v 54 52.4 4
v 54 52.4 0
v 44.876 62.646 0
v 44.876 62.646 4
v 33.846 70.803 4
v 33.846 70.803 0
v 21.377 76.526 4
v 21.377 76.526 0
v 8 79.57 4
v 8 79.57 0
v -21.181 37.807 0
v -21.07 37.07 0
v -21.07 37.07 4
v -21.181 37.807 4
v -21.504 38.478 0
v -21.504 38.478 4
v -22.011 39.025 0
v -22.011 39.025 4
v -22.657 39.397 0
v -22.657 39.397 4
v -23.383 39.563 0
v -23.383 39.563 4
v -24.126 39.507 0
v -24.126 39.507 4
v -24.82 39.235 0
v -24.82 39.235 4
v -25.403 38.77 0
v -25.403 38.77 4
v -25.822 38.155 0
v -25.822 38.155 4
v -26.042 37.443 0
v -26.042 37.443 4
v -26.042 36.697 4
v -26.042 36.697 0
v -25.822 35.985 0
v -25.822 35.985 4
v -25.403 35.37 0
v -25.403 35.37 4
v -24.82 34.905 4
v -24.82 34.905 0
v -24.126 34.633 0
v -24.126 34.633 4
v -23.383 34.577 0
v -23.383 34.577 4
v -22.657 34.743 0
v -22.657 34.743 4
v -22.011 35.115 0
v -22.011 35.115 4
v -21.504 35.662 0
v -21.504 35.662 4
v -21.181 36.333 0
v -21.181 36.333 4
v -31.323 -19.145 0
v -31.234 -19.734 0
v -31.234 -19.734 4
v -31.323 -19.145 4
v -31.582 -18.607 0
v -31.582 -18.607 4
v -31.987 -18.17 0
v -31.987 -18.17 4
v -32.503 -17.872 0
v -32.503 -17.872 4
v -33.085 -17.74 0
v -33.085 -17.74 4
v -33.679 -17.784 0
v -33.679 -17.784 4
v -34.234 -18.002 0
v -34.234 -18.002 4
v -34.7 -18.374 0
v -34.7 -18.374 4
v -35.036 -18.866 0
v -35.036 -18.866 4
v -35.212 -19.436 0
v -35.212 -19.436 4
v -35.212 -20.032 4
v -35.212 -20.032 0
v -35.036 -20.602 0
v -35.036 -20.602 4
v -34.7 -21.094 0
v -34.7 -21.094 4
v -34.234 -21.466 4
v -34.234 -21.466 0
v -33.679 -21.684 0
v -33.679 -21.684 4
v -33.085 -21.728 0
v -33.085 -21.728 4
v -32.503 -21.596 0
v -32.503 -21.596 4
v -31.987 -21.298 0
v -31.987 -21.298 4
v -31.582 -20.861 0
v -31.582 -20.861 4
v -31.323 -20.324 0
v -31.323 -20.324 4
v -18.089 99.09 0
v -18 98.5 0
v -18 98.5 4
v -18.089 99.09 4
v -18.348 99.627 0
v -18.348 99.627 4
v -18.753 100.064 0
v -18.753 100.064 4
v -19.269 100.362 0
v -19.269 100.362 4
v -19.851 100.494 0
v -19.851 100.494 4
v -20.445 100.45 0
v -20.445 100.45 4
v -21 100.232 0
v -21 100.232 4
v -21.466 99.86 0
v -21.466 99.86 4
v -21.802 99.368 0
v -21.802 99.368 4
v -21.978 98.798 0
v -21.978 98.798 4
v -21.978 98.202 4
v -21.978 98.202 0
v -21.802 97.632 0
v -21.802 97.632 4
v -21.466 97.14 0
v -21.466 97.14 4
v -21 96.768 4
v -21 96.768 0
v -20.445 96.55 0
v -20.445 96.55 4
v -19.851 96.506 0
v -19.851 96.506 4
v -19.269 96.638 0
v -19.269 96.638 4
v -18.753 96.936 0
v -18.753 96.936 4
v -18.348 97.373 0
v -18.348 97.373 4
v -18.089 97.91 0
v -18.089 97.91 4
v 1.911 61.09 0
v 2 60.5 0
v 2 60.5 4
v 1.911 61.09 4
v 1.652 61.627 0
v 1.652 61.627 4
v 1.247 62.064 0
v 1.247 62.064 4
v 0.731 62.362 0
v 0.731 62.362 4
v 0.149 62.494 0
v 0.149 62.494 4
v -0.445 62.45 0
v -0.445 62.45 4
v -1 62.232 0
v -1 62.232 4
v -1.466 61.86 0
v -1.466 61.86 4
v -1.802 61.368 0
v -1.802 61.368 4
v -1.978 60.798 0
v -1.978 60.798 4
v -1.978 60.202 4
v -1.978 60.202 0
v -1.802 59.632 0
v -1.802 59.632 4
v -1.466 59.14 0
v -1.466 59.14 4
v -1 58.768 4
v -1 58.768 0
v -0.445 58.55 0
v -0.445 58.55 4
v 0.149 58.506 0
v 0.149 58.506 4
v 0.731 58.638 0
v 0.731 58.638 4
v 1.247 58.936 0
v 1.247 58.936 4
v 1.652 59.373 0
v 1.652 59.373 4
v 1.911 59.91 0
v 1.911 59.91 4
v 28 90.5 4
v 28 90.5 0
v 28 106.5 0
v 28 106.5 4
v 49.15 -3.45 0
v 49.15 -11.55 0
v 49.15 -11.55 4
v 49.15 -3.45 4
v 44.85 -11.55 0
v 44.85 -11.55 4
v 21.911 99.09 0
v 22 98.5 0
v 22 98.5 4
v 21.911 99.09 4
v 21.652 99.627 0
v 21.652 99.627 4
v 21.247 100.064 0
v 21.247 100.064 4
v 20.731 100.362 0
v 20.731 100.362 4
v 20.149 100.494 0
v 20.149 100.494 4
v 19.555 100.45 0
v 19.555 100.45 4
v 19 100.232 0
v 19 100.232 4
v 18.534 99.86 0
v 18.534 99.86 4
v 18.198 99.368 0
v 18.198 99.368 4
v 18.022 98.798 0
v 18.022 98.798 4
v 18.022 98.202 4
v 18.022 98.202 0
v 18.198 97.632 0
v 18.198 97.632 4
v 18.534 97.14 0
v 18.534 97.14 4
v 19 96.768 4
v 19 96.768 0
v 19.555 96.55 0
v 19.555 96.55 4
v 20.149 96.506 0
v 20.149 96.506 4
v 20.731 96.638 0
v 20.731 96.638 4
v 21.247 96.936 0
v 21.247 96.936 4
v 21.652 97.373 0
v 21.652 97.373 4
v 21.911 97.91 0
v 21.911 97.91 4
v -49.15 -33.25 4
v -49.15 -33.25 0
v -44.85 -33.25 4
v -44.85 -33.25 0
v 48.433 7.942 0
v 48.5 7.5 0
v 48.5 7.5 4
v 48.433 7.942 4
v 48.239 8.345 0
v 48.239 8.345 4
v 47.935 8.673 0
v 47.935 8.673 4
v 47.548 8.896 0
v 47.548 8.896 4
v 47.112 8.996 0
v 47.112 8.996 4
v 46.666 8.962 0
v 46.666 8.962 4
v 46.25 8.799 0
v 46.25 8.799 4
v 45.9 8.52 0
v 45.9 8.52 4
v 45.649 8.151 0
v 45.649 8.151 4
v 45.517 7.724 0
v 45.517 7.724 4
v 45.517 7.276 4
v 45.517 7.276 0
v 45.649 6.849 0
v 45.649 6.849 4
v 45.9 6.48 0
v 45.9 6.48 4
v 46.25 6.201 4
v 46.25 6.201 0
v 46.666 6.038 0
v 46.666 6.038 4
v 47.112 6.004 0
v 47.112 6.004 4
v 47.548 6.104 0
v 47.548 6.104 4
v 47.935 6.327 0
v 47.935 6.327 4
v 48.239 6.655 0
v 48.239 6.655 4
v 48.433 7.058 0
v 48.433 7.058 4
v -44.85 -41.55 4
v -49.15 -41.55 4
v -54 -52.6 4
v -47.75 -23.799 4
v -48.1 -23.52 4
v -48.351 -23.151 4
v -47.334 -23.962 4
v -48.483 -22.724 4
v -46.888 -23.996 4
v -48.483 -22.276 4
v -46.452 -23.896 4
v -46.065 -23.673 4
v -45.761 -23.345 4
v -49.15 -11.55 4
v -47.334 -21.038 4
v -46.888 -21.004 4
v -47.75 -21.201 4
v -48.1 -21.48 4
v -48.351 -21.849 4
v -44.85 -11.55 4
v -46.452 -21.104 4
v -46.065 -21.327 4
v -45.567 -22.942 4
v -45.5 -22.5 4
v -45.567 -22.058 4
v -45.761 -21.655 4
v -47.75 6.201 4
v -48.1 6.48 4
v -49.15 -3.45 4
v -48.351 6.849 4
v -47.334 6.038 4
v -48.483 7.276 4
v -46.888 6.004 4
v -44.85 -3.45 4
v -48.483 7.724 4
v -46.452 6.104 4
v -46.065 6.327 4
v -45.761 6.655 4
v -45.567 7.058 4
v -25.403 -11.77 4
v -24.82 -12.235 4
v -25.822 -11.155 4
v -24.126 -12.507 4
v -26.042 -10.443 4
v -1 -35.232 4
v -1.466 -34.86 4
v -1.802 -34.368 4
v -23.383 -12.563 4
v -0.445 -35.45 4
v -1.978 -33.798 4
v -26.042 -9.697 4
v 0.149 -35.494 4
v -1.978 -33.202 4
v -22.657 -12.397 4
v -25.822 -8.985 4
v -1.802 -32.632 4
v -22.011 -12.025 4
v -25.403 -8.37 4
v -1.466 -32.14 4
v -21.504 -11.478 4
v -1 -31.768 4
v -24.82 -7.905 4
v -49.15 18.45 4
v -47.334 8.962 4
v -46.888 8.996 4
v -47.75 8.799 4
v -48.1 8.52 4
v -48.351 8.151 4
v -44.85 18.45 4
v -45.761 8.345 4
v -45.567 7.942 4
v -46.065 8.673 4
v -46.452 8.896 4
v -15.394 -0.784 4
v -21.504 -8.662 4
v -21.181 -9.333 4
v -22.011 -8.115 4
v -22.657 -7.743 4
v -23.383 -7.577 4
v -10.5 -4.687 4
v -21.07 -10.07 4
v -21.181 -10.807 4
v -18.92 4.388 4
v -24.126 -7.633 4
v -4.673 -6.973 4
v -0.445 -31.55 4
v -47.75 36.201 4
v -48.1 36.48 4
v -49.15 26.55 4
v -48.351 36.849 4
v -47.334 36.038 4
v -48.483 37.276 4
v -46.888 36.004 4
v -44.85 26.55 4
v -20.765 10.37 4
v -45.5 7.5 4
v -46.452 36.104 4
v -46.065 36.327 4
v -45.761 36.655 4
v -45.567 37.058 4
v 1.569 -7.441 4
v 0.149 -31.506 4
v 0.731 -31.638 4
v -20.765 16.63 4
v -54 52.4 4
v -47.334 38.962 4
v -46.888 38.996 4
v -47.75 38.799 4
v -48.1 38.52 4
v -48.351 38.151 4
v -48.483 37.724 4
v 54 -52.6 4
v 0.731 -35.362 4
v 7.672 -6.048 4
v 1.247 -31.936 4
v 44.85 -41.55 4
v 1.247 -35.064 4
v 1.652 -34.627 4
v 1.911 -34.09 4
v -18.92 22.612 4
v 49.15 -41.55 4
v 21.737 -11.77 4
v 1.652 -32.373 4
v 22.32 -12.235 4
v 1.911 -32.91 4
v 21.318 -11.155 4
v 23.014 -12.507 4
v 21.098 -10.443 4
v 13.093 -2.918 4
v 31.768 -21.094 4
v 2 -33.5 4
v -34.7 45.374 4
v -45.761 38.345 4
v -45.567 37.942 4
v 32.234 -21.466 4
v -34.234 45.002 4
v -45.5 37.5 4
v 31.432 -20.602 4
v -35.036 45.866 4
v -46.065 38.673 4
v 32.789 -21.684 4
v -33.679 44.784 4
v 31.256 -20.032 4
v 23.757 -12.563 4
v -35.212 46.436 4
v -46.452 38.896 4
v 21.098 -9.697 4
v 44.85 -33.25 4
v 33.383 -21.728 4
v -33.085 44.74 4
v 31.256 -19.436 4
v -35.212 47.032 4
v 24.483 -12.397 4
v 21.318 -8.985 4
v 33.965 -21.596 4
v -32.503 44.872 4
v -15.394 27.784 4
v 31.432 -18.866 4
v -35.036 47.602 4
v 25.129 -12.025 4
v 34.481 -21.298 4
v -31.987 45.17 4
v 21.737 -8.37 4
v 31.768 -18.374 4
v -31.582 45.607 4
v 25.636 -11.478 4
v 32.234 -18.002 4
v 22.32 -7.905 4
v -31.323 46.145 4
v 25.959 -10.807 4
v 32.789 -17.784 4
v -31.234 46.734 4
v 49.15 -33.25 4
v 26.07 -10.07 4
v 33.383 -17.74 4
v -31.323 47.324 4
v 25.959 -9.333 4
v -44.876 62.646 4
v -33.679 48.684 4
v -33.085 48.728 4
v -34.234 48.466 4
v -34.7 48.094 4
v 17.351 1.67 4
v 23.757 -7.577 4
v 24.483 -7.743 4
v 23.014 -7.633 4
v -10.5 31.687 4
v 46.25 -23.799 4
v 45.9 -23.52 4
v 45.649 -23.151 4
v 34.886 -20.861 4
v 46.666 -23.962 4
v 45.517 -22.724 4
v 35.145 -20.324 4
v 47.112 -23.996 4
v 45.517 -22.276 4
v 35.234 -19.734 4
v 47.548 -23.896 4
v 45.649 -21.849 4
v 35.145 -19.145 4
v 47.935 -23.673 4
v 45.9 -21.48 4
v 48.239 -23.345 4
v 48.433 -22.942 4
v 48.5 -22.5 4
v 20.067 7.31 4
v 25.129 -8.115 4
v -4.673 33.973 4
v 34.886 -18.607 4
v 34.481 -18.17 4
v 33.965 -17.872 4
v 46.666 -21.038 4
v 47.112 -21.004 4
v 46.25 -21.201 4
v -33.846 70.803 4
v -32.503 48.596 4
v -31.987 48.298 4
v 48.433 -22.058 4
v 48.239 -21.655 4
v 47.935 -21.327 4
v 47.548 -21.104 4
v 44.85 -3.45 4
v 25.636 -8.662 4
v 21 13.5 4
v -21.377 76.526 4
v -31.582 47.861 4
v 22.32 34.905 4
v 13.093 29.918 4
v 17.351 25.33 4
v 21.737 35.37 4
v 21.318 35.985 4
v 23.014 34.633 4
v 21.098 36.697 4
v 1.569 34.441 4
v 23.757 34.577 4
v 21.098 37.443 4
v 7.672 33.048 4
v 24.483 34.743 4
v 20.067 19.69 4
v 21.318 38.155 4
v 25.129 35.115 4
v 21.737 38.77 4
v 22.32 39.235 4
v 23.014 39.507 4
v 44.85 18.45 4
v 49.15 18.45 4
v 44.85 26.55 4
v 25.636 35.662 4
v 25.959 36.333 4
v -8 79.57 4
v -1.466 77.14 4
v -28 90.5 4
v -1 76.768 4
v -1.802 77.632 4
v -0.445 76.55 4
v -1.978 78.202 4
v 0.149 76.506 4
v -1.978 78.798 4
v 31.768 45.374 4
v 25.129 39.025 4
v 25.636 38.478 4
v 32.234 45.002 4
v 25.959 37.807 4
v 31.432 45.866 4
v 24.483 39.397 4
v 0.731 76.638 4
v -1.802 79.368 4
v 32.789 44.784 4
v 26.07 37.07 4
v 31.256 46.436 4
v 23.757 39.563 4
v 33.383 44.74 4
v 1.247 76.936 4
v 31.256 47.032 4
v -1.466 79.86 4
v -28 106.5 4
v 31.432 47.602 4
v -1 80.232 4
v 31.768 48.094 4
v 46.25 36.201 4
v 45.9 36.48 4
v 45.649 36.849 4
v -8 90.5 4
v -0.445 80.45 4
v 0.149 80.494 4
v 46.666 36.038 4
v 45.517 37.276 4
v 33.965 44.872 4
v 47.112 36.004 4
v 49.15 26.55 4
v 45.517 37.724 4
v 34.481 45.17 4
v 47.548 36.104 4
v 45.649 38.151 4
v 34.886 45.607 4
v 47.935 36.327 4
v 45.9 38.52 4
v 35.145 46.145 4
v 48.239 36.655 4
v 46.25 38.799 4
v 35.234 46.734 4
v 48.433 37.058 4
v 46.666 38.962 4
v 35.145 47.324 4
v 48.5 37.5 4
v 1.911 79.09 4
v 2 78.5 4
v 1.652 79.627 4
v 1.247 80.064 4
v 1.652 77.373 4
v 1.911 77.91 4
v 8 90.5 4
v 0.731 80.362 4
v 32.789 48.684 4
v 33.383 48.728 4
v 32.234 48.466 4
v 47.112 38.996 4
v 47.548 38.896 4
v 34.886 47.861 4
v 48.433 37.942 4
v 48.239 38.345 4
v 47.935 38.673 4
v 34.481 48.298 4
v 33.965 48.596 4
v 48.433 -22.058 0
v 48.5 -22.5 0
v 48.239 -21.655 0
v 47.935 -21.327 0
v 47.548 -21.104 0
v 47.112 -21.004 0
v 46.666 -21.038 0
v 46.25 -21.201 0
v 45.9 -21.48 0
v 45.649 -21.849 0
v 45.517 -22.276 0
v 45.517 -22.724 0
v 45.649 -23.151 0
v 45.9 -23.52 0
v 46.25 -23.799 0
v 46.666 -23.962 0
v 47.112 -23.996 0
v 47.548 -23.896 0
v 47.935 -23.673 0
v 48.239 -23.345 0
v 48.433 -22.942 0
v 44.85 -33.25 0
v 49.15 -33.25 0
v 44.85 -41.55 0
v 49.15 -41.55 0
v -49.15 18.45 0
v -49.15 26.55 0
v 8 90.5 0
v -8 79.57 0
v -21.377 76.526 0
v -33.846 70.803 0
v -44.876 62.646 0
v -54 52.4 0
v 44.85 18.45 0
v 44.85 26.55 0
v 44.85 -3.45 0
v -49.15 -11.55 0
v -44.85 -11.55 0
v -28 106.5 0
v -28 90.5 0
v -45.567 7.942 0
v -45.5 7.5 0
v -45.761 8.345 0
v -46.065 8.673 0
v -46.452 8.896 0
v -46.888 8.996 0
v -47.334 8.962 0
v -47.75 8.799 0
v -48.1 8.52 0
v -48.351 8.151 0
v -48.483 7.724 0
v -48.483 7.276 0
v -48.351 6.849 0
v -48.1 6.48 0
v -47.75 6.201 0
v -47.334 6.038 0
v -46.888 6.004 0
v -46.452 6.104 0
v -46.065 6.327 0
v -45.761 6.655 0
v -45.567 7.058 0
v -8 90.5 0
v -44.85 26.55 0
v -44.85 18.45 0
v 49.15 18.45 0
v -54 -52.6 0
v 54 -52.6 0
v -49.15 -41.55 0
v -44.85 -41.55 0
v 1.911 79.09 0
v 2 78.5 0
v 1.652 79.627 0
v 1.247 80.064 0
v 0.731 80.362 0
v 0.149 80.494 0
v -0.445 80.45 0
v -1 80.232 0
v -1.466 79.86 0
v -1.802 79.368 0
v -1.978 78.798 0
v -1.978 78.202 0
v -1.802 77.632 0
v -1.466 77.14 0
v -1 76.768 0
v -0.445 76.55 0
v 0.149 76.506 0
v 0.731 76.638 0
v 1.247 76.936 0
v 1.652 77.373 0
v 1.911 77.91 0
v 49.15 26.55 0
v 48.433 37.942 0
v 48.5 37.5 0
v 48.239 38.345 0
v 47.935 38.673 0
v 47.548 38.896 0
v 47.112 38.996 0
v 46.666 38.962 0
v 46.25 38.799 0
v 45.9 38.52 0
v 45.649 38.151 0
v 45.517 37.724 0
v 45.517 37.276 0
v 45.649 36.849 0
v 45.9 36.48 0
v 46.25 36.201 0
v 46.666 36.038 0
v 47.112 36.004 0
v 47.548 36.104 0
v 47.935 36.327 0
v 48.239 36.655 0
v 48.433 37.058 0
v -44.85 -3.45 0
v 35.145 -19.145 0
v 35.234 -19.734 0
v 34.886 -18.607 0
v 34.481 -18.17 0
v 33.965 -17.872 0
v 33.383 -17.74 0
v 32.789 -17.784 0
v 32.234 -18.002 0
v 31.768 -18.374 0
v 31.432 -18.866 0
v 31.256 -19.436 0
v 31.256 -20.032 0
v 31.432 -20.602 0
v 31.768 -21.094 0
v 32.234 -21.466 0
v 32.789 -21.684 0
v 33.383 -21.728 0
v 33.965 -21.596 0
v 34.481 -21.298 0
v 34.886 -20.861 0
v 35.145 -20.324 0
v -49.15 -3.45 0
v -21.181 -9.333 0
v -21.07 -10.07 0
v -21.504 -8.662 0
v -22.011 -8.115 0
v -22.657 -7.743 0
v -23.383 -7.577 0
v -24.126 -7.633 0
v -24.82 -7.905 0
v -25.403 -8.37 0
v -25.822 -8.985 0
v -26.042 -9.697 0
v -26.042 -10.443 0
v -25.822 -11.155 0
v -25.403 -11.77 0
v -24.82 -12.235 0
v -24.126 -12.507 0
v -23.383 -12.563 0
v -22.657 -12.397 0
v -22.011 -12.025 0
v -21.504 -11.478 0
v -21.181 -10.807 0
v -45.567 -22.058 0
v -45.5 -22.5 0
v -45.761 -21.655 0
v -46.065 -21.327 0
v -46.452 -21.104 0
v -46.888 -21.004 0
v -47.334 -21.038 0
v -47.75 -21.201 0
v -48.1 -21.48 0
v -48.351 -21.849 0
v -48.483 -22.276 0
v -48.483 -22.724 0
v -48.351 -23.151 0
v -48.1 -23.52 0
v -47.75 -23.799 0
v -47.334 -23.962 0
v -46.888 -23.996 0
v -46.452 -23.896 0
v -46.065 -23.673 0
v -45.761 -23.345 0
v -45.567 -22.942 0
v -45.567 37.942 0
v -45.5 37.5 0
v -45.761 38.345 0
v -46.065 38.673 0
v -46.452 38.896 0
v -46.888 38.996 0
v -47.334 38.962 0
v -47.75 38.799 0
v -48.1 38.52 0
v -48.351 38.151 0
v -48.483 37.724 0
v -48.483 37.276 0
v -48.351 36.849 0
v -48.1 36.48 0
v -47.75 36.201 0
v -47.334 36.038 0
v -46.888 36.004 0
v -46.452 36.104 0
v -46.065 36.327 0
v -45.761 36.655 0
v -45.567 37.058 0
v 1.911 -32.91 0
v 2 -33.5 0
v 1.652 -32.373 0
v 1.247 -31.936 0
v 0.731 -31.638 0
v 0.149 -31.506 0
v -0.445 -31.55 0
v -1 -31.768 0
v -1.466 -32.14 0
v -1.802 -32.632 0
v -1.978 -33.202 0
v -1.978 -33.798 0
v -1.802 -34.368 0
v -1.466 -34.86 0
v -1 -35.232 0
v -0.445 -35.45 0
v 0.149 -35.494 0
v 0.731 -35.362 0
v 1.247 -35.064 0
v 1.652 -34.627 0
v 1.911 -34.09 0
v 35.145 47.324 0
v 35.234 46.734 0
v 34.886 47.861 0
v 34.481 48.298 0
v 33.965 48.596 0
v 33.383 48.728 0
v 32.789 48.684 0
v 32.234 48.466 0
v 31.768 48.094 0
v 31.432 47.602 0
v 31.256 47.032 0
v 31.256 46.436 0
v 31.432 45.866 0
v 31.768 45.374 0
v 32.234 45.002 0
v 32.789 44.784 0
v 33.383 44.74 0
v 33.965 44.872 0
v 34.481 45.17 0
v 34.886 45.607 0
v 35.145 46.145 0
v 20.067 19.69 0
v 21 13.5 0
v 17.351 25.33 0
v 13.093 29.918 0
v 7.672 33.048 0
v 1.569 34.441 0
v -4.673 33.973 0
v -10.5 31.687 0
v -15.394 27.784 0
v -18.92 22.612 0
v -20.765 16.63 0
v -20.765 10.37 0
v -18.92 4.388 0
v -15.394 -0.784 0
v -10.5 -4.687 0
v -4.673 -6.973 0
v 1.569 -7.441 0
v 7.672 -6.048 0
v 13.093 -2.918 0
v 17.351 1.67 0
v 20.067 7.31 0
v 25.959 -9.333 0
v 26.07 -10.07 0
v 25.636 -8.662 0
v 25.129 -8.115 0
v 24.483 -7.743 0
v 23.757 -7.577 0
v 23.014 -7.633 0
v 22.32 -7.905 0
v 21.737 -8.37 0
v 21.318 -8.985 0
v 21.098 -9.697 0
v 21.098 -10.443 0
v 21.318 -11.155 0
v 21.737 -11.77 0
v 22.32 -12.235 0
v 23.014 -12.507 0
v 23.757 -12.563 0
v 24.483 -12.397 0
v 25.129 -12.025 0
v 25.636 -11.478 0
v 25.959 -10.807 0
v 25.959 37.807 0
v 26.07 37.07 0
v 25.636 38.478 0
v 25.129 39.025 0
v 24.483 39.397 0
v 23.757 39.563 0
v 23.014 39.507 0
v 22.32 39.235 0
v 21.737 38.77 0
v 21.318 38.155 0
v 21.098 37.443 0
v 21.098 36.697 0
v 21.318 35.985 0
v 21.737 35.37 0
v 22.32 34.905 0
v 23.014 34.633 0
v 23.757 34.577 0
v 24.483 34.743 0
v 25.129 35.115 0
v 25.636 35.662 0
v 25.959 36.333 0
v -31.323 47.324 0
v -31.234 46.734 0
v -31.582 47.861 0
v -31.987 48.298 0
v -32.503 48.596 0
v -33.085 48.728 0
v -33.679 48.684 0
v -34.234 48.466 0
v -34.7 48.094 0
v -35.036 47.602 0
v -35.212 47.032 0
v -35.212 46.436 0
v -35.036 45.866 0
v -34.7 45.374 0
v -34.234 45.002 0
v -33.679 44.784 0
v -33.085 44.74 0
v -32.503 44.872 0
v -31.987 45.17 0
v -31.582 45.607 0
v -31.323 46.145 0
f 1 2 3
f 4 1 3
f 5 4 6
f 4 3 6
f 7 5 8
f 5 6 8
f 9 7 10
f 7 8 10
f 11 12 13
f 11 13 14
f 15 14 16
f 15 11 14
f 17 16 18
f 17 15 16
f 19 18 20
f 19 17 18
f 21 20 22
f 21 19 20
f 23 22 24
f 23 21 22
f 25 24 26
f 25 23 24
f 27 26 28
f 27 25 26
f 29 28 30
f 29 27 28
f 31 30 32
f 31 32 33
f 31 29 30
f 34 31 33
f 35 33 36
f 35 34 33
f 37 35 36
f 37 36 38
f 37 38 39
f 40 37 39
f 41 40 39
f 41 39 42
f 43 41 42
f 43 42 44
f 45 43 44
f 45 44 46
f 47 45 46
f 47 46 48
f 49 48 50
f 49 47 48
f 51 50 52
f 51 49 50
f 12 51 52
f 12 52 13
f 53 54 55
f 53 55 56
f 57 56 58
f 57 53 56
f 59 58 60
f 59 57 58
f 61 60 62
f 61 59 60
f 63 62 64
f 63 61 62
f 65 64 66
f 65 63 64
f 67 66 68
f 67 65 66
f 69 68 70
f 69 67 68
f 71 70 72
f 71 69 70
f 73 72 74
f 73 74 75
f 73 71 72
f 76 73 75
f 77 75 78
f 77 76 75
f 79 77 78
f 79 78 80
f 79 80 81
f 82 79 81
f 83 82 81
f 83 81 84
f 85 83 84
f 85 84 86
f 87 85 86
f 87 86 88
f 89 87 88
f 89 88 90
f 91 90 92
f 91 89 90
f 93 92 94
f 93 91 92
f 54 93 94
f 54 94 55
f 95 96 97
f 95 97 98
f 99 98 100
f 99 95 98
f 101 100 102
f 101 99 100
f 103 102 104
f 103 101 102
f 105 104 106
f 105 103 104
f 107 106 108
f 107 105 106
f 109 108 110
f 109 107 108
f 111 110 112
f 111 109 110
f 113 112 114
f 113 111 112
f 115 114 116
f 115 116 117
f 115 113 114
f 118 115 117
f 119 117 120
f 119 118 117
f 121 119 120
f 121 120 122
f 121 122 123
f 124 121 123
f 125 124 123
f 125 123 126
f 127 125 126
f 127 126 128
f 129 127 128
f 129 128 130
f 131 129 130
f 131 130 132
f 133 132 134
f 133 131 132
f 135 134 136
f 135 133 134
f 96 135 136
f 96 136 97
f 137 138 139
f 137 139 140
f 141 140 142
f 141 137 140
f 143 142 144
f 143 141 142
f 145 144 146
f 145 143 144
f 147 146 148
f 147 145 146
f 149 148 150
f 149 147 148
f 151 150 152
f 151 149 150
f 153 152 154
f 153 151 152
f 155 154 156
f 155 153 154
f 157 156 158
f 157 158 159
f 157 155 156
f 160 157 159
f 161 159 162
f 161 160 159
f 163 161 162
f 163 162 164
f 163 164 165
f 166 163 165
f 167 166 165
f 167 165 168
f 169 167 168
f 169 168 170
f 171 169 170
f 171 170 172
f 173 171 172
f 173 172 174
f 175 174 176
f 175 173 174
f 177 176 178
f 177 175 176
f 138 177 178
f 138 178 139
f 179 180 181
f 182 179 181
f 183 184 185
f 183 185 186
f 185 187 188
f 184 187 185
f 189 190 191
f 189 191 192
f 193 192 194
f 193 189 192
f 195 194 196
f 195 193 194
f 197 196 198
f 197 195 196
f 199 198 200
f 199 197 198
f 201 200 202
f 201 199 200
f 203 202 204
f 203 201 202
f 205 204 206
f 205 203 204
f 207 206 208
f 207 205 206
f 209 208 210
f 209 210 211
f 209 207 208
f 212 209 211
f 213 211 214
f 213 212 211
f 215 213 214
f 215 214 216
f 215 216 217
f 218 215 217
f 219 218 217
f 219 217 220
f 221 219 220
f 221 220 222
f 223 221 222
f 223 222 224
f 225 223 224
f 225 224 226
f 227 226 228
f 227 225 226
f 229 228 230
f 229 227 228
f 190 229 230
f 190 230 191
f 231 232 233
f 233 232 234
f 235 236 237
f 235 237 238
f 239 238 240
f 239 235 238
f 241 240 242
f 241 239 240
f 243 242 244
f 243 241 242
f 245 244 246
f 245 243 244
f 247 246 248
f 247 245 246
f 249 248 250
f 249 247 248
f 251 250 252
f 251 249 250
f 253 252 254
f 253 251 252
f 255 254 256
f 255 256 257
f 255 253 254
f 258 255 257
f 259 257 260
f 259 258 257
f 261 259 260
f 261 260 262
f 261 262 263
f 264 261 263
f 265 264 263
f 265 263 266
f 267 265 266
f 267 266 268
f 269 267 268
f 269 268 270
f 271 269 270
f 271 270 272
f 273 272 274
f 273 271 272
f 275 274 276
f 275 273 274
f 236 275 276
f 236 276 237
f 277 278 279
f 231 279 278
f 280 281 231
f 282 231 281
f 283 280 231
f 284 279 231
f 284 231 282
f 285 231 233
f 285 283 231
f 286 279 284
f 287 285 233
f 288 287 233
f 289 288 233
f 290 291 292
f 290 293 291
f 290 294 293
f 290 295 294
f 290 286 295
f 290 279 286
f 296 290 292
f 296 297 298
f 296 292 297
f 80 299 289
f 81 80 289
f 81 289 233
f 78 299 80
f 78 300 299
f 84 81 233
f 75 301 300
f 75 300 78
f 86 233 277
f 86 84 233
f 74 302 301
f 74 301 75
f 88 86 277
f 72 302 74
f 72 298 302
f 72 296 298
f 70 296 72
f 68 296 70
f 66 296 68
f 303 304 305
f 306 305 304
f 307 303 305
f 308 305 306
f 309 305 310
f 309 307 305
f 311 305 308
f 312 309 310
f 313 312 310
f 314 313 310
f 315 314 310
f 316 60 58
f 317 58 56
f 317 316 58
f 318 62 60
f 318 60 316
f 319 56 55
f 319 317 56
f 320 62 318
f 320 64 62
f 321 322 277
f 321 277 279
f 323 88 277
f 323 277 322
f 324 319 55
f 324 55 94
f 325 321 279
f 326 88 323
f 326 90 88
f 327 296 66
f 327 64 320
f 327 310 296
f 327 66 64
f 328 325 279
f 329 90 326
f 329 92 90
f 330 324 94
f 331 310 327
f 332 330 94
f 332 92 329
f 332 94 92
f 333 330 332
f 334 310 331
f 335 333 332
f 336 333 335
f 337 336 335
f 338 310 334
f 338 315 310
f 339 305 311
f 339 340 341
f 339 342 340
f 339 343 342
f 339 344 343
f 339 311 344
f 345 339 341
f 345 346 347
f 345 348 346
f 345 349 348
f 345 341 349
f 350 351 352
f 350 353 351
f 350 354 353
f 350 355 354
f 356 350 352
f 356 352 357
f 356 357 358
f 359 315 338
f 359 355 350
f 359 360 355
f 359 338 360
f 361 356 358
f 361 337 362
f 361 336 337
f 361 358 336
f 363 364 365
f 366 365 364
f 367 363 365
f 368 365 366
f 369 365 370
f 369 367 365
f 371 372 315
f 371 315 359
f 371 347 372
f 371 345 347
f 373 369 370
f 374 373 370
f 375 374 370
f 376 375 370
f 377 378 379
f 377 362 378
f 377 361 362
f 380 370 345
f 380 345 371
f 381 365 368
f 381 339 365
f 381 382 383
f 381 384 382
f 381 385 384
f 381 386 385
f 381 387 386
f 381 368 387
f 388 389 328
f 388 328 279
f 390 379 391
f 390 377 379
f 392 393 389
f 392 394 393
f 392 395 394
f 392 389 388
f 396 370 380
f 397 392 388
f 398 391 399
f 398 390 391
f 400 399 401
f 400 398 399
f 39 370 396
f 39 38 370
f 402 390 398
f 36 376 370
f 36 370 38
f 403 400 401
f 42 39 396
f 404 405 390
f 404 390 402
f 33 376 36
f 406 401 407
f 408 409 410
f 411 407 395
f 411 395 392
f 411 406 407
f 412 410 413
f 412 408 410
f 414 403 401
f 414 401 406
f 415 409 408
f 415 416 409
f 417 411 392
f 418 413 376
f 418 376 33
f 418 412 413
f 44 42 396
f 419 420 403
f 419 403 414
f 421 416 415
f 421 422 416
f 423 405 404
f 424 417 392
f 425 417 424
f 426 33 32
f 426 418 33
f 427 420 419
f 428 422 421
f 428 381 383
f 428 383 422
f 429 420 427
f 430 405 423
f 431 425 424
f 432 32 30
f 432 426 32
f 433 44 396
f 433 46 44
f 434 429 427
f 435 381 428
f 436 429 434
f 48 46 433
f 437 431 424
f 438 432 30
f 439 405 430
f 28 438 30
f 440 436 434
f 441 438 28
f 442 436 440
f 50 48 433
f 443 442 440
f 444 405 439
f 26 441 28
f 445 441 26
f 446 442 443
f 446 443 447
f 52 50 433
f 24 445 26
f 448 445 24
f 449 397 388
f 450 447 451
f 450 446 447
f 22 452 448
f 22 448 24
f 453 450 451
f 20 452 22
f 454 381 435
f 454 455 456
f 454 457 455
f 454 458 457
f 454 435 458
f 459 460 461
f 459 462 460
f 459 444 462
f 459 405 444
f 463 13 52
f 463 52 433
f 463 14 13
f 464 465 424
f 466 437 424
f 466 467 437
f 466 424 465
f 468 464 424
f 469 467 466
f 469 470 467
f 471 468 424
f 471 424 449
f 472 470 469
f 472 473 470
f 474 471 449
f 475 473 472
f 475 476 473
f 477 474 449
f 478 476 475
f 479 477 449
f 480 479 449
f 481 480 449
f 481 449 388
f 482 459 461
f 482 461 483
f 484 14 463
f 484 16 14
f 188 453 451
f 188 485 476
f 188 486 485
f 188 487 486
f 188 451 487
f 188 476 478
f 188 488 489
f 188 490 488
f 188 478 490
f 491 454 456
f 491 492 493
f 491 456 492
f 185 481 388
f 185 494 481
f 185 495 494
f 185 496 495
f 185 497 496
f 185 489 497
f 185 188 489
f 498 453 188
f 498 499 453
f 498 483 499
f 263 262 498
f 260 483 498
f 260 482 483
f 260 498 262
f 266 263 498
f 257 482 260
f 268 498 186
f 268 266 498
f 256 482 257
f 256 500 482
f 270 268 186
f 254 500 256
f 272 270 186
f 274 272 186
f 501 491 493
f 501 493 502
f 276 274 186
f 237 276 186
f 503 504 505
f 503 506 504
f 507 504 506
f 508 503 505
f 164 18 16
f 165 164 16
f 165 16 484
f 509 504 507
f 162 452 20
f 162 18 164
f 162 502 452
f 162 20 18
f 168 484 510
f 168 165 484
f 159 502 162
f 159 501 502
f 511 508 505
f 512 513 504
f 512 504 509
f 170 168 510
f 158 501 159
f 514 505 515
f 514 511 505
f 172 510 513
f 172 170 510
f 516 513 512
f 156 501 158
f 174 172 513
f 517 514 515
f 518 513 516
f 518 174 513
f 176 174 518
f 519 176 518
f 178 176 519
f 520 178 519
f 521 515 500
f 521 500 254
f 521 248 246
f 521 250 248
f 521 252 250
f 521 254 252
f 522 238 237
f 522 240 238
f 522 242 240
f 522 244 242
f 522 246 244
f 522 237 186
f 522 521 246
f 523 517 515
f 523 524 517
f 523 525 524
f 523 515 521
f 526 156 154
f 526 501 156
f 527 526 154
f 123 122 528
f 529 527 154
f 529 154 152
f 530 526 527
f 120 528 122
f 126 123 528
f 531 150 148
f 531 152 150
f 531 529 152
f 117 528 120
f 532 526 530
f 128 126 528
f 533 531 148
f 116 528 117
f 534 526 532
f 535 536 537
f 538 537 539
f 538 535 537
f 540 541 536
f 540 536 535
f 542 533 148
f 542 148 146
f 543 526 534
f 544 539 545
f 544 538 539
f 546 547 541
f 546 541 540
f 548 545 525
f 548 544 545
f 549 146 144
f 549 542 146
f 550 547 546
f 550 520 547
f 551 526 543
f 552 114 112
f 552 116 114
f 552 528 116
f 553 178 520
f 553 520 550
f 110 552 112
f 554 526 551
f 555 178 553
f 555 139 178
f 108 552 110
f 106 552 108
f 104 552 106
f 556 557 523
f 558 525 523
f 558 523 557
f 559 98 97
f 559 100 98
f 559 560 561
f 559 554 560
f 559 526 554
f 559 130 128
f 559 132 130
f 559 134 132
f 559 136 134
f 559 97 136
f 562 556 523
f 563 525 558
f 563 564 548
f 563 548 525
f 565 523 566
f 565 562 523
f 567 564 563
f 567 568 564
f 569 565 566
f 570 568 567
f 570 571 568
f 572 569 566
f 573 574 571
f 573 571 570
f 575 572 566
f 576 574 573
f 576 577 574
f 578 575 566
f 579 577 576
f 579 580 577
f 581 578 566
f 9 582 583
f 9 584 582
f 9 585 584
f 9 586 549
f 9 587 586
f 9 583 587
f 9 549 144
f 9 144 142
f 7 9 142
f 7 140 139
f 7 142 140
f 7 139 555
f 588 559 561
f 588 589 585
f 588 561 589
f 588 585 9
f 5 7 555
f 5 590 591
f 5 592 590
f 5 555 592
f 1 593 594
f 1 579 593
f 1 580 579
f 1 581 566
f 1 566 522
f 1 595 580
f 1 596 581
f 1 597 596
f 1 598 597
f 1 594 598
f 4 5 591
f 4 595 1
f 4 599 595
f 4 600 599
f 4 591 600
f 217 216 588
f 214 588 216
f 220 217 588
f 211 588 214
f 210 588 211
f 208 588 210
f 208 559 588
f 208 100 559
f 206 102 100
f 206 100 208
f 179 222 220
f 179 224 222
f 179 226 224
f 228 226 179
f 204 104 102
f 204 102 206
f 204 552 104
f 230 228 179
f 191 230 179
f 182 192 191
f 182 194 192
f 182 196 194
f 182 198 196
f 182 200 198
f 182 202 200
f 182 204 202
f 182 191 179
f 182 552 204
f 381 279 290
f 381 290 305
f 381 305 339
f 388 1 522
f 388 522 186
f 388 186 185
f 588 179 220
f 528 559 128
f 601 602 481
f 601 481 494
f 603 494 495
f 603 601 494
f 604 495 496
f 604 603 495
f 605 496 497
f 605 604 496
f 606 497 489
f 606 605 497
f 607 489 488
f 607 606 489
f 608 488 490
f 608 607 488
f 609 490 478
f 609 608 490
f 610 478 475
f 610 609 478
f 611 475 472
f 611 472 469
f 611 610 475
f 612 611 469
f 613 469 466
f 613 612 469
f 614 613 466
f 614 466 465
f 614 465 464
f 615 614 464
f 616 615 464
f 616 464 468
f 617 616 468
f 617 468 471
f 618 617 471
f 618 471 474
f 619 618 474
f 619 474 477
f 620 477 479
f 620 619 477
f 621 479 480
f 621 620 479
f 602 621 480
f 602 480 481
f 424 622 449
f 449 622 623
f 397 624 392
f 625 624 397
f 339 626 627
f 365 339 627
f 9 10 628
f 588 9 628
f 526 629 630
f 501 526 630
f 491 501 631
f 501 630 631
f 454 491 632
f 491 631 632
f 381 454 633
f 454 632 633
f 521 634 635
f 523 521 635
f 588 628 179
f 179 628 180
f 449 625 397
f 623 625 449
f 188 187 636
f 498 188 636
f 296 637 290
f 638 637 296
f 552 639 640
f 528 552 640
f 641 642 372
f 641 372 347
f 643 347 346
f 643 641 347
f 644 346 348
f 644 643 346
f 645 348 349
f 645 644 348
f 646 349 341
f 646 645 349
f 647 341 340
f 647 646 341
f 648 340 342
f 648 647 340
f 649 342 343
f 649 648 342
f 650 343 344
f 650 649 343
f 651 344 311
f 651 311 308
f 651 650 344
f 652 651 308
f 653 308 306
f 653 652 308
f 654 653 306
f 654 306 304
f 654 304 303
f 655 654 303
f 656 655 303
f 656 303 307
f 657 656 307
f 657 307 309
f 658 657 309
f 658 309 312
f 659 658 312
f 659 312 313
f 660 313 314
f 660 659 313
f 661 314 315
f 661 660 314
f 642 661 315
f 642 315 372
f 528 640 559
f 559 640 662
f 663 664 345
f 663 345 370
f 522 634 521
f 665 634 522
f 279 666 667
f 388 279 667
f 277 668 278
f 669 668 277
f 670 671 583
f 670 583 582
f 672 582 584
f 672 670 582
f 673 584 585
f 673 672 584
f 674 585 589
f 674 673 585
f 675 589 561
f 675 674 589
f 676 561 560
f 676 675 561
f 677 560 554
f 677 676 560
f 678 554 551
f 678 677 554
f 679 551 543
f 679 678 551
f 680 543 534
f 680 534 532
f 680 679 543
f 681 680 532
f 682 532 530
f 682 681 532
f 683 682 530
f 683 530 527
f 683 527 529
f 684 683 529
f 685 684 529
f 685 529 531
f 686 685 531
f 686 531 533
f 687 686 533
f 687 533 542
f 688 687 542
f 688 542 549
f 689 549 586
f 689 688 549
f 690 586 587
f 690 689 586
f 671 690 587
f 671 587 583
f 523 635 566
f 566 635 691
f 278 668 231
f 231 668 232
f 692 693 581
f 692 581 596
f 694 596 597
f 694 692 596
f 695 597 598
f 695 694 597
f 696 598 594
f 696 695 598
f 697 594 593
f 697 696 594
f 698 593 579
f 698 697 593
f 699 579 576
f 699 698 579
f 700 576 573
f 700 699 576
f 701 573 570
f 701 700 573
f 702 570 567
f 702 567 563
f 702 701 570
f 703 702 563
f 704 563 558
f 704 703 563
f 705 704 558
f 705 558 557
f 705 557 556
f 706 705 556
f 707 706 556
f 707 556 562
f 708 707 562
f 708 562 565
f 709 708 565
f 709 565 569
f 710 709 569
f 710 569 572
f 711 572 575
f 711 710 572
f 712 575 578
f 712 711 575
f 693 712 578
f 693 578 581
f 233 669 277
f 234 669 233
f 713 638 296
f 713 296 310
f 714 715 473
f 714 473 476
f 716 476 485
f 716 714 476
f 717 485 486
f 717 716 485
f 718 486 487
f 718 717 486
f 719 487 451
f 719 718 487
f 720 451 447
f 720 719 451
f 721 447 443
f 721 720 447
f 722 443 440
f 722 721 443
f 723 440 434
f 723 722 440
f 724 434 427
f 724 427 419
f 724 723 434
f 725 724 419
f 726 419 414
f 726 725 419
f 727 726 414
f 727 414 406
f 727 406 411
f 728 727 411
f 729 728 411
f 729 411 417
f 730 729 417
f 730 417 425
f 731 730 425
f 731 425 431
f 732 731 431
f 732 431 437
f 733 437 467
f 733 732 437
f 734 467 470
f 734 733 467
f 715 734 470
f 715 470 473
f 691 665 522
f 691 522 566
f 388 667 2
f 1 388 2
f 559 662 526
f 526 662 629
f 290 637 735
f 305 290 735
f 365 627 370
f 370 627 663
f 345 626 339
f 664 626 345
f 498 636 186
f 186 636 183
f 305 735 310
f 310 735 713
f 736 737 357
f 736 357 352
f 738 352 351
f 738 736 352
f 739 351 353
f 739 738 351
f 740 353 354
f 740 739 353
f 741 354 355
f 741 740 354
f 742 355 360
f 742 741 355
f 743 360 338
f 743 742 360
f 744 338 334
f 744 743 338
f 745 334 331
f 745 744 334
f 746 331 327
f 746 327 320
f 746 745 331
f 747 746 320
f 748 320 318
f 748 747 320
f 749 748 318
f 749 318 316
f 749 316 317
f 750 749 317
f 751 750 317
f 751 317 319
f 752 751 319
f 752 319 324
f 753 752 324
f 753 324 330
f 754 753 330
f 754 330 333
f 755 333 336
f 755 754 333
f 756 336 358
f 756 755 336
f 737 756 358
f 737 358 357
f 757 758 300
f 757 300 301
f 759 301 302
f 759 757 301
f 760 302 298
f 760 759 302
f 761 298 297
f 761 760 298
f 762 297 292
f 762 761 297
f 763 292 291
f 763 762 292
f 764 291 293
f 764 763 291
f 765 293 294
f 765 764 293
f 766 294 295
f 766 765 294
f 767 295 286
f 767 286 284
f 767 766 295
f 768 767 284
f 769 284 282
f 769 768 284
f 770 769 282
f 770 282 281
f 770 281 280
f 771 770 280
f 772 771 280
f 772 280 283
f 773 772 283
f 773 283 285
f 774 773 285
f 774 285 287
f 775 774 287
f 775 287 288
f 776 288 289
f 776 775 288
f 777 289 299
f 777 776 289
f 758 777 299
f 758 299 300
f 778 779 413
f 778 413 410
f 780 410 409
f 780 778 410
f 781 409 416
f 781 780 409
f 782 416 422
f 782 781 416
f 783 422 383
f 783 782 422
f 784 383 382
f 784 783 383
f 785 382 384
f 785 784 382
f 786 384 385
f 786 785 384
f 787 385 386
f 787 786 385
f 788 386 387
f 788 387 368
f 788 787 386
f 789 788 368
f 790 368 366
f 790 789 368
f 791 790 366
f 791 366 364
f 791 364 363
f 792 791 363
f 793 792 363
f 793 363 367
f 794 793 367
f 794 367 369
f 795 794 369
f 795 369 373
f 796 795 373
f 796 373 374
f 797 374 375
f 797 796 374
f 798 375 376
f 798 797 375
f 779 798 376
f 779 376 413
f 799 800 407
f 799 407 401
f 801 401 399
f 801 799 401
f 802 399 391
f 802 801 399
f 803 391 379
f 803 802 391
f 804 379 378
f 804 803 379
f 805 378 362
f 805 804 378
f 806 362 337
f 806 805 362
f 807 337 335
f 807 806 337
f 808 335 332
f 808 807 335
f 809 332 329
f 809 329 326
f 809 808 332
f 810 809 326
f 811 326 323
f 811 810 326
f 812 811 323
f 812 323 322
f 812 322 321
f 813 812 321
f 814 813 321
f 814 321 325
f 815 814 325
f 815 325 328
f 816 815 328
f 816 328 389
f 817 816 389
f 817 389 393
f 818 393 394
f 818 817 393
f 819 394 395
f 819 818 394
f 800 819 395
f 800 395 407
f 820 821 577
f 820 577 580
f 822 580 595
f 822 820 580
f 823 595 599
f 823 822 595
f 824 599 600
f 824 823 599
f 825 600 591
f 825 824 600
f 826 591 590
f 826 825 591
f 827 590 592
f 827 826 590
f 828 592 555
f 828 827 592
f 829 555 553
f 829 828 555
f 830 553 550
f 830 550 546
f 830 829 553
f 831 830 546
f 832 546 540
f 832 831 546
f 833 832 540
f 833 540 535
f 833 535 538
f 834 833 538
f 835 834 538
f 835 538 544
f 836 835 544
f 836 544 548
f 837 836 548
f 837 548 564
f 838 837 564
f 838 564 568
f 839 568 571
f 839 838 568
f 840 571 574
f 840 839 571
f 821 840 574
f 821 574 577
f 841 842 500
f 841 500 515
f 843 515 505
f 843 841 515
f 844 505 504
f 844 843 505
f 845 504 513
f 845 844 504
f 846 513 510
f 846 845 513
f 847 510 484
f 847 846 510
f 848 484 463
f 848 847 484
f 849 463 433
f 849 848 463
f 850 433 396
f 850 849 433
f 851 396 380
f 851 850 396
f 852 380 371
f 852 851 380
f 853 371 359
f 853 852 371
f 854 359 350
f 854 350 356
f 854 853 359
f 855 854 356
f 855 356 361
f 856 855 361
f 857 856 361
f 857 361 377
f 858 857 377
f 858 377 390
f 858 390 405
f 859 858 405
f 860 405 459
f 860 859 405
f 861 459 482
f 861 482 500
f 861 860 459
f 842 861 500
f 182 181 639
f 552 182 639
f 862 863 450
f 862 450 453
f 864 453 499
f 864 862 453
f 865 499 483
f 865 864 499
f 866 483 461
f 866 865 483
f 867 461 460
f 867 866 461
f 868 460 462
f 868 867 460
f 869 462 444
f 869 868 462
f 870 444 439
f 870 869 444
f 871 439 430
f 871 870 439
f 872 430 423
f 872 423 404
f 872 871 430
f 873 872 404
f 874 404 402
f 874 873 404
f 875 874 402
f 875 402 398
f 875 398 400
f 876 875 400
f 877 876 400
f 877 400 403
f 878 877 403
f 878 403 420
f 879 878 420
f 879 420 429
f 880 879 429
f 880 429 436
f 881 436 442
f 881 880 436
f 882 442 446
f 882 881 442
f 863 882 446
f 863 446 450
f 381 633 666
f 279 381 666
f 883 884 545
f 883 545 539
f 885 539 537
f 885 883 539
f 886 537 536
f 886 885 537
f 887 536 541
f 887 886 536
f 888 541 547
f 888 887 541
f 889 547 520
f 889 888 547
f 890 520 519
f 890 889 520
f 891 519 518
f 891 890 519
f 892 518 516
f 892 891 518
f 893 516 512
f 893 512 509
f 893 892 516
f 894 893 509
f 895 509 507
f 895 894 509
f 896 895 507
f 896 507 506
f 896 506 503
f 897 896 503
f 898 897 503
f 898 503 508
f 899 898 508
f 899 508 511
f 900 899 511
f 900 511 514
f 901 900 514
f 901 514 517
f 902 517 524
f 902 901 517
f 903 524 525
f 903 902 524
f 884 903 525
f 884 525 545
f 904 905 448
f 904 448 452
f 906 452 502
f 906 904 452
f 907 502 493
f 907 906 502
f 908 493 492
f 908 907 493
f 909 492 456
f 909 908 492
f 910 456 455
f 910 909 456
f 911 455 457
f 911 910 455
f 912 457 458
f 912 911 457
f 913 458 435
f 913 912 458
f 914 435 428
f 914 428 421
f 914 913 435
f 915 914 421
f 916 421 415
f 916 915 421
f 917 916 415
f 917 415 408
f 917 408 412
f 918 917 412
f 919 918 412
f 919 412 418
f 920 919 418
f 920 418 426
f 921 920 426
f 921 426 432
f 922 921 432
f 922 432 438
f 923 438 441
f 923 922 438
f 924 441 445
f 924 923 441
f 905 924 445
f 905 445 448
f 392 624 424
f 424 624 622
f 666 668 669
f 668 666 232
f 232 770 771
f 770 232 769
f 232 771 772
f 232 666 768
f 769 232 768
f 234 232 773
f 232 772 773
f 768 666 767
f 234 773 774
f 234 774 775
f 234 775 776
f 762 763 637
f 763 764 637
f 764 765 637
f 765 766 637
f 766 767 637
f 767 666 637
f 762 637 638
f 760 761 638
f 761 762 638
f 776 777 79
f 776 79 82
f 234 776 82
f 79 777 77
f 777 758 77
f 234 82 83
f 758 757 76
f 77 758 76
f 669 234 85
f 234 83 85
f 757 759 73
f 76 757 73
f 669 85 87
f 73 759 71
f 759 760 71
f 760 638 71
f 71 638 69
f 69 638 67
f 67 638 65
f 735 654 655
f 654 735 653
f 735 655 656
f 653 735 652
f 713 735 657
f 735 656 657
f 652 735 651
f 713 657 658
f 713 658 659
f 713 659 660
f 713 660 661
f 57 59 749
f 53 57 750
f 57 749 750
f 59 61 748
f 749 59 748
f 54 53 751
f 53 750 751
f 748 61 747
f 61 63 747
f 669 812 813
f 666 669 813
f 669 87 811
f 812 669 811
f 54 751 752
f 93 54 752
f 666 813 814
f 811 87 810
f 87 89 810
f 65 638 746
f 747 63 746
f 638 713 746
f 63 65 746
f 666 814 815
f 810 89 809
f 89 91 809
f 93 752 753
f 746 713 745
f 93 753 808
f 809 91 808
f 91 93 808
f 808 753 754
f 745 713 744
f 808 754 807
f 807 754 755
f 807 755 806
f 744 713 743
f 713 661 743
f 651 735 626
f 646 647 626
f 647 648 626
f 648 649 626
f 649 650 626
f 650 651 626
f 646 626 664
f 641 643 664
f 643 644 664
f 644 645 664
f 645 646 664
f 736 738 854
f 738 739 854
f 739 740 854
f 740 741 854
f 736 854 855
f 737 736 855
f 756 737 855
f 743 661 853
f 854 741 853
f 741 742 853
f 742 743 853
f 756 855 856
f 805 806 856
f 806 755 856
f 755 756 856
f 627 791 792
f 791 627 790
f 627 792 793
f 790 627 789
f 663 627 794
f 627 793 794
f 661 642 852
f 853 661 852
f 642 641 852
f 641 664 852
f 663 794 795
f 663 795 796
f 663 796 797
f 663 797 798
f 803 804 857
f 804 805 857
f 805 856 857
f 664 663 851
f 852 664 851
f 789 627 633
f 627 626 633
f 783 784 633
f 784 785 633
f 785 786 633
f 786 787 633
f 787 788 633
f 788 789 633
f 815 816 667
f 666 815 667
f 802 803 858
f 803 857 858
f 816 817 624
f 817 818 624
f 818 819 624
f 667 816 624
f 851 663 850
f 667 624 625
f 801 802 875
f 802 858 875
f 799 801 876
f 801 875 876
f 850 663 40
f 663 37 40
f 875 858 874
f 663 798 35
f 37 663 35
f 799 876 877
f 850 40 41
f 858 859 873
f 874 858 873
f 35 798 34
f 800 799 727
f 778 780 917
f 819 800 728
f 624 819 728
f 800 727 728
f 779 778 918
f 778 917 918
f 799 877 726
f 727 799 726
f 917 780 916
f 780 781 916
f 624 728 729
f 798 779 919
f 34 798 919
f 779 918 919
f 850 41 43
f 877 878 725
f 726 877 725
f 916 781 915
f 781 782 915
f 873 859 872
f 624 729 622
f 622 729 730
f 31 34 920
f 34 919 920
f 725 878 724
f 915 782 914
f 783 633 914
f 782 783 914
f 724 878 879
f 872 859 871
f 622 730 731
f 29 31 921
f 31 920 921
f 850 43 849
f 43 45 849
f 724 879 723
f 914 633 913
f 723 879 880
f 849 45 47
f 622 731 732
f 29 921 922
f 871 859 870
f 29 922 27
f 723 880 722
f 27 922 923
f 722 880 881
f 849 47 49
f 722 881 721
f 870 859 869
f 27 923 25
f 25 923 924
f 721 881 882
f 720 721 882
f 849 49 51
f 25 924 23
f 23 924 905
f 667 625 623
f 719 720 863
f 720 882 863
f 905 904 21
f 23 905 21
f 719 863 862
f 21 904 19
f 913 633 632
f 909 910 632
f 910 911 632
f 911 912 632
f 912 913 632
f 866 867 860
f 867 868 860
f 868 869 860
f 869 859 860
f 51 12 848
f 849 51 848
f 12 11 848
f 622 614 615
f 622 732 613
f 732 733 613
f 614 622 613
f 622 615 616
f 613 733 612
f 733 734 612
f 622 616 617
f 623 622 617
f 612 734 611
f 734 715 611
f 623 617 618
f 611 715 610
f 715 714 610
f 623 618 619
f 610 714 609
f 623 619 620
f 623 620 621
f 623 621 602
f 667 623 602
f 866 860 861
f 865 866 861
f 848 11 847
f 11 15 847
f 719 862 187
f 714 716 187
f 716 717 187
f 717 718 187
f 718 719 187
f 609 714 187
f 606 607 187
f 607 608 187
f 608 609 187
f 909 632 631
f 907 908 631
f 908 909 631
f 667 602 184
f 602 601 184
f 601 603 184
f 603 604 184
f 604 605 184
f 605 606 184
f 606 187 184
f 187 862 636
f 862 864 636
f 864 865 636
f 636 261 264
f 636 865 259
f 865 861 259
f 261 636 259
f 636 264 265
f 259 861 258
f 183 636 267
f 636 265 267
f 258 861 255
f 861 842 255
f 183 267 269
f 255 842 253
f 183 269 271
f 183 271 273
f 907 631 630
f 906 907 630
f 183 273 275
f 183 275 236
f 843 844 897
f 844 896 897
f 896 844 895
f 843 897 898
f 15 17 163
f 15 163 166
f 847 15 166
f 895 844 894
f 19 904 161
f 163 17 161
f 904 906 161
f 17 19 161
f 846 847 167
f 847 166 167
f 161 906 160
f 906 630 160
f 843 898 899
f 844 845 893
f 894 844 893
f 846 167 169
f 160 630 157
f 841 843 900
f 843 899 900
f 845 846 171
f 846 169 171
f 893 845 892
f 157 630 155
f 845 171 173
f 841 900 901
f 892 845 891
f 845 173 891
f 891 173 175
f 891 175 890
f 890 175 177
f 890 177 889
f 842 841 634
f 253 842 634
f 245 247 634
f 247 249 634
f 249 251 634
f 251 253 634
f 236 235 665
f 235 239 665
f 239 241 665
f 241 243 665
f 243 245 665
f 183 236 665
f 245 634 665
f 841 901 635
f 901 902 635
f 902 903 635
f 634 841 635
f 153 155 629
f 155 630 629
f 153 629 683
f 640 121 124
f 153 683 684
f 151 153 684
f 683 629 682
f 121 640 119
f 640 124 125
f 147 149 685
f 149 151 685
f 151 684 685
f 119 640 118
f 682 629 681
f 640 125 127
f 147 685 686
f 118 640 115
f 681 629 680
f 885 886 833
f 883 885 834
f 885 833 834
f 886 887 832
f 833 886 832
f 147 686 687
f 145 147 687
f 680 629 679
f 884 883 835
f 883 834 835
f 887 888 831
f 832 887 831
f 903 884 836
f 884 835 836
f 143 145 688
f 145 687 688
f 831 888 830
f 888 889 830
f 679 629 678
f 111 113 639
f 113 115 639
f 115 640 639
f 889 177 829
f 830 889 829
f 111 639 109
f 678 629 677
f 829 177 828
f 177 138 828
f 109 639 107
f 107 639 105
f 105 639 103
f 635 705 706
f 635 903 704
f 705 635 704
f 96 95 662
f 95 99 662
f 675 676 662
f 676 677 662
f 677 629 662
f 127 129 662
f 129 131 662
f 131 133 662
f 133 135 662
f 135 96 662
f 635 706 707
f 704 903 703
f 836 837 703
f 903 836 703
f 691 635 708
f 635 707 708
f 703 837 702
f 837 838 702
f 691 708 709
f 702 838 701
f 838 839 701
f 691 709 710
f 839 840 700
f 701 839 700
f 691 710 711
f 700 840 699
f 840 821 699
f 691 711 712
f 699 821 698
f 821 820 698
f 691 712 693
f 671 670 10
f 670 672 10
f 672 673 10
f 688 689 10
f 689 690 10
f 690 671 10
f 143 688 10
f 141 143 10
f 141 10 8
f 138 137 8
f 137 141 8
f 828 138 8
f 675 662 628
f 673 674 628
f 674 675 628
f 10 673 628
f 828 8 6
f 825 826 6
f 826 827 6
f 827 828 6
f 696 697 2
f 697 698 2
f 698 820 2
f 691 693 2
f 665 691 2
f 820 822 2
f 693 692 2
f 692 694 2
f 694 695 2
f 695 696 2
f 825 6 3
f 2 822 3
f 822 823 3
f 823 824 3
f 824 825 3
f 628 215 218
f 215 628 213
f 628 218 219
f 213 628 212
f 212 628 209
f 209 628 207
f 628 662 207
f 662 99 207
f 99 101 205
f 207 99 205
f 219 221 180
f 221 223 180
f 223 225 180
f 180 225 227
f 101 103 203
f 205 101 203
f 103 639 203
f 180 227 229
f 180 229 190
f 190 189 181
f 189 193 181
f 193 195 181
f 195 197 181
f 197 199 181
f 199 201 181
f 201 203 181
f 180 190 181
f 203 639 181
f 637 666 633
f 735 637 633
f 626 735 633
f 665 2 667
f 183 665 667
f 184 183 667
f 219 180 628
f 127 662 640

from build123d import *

# Parameters (mm, degrees)
SKETCH_1_R      = 1.5
SKETCH_1_R_2    = 2.5
SKETCH_1_R_3    = 21
SKETCH_1_R_4    = 2
SKETCH_1_W      = 4.3
SKETCH_1_H      = 8.1
SKETCH_1_H_2    = 8.3
EXTRUDE_1_DEPTH = 4


with BuildPart() as part:
    # 草图1 → 凸台-拉伸1 (new body)
    with BuildSketch(Plane.XY):
        with BuildLine():
            Line((-54, 52.4), (-54, -52.6))
            Line((-54, -52.6), (54, -52.6))
            Line((54, -52.6), (54, 52.4))
            ThreePointArc((54, 52.4), (33.845954515, 70.803240423), (8, 79.569735886))
            Line((8, 79.569735886), (8, 90.5))
            Line((8, 90.5), (28, 90.5))
            Line((28, 90.5), (28, 106.5))
            Line((28, 106.5), (-28, 106.5))
            Line((-28, 106.5), (-28, 90.5))
            Line((-28, 90.5), (-8, 90.5))
            Line((-8, 90.5), (-8, 79.569735886))
            ThreePointArc((-8, 79.569735886), (-33.845954515, 70.803240423), (-54, 52.4))
        make_face()
        with Locations((-47, 37.5)):
            Circle(SKETCH_1_R, mode=Mode.SUBTRACT)
        with Locations((-47, 7.5)):
            Circle(SKETCH_1_R, mode=Mode.SUBTRACT)
        with Locations((-47, -22.5)):
            Circle(SKETCH_1_R, mode=Mode.SUBTRACT)
        with Locations((-23.57, 37.07)):
            Circle(SKETCH_1_R_2, mode=Mode.SUBTRACT)
        with Locations((-23.57, -10.07)):
            Circle(SKETCH_1_R_2, mode=Mode.SUBTRACT)
        with Locations((23.57, -10.07)):
            Circle(SKETCH_1_R_2, mode=Mode.SUBTRACT)
        with Locations((23.57, 37.07)):
            Circle(SKETCH_1_R_2, mode=Mode.SUBTRACT)
        with Locations((47, -22.5)):
            Circle(SKETCH_1_R, mode=Mode.SUBTRACT)
        with Locations((47, 7.5)):
            Circle(SKETCH_1_R, mode=Mode.SUBTRACT)
        with Locations((47, 37.5)):
            Circle(SKETCH_1_R, mode=Mode.SUBTRACT)
        with Locations((0, 13.5)):
            Circle(SKETCH_1_R_3, mode=Mode.SUBTRACT)
        with Locations((0, 60.5)):
            Circle(SKETCH_1_R_4, mode=Mode.SUBTRACT)
        with Locations((33.234018716, 46.734018716)):
            Circle(SKETCH_1_R_4, mode=Mode.SUBTRACT)
        with Locations((33.234018716, -19.734018716)):
            Circle(SKETCH_1_R_4, mode=Mode.SUBTRACT)
        with Locations((0, -33.5)):
            Circle(SKETCH_1_R_4, mode=Mode.SUBTRACT)
        with Locations((-33.234018716, -19.734018716)):
            Circle(SKETCH_1_R_4, mode=Mode.SUBTRACT)
        with Locations((-33.234018716, 46.734018716)):
            Circle(SKETCH_1_R_4, mode=Mode.SUBTRACT)
        with Locations((0, 78.5)):
            Circle(SKETCH_1_R_4, mode=Mode.SUBTRACT)
        with Locations((-20, 98.5)):
            Circle(SKETCH_1_R_4, mode=Mode.SUBTRACT)
        with Locations((20, 98.5)):
            Circle(SKETCH_1_R_4, mode=Mode.SUBTRACT)
        with Locations((-47, 22.5)):
            Rectangle(SKETCH_1_W, SKETCH_1_H, mode=Mode.SUBTRACT)
        with Locations((-47, -7.5)):
            Rectangle(SKETCH_1_W, SKETCH_1_H, mode=Mode.SUBTRACT)
        with Locations((-47, -37.4)):
            Rectangle(SKETCH_1_W, SKETCH_1_H_2, mode=Mode.SUBTRACT)
        with Locations((47, -37.4)):
            Rectangle(SKETCH_1_W, SKETCH_1_H_2, mode=Mode.SUBTRACT)
        with Locations((47, -7.5)):
            Rectangle(SKETCH_1_W, SKETCH_1_H, mode=Mode.SUBTRACT)
        with Locations((47, 22.5)):
            Rectangle(SKETCH_1_W, SKETCH_1_H, mode=Mode.SUBTRACT)
    extrude(amount=EXTRUDE_1_DEPTH)


solid = part.part
